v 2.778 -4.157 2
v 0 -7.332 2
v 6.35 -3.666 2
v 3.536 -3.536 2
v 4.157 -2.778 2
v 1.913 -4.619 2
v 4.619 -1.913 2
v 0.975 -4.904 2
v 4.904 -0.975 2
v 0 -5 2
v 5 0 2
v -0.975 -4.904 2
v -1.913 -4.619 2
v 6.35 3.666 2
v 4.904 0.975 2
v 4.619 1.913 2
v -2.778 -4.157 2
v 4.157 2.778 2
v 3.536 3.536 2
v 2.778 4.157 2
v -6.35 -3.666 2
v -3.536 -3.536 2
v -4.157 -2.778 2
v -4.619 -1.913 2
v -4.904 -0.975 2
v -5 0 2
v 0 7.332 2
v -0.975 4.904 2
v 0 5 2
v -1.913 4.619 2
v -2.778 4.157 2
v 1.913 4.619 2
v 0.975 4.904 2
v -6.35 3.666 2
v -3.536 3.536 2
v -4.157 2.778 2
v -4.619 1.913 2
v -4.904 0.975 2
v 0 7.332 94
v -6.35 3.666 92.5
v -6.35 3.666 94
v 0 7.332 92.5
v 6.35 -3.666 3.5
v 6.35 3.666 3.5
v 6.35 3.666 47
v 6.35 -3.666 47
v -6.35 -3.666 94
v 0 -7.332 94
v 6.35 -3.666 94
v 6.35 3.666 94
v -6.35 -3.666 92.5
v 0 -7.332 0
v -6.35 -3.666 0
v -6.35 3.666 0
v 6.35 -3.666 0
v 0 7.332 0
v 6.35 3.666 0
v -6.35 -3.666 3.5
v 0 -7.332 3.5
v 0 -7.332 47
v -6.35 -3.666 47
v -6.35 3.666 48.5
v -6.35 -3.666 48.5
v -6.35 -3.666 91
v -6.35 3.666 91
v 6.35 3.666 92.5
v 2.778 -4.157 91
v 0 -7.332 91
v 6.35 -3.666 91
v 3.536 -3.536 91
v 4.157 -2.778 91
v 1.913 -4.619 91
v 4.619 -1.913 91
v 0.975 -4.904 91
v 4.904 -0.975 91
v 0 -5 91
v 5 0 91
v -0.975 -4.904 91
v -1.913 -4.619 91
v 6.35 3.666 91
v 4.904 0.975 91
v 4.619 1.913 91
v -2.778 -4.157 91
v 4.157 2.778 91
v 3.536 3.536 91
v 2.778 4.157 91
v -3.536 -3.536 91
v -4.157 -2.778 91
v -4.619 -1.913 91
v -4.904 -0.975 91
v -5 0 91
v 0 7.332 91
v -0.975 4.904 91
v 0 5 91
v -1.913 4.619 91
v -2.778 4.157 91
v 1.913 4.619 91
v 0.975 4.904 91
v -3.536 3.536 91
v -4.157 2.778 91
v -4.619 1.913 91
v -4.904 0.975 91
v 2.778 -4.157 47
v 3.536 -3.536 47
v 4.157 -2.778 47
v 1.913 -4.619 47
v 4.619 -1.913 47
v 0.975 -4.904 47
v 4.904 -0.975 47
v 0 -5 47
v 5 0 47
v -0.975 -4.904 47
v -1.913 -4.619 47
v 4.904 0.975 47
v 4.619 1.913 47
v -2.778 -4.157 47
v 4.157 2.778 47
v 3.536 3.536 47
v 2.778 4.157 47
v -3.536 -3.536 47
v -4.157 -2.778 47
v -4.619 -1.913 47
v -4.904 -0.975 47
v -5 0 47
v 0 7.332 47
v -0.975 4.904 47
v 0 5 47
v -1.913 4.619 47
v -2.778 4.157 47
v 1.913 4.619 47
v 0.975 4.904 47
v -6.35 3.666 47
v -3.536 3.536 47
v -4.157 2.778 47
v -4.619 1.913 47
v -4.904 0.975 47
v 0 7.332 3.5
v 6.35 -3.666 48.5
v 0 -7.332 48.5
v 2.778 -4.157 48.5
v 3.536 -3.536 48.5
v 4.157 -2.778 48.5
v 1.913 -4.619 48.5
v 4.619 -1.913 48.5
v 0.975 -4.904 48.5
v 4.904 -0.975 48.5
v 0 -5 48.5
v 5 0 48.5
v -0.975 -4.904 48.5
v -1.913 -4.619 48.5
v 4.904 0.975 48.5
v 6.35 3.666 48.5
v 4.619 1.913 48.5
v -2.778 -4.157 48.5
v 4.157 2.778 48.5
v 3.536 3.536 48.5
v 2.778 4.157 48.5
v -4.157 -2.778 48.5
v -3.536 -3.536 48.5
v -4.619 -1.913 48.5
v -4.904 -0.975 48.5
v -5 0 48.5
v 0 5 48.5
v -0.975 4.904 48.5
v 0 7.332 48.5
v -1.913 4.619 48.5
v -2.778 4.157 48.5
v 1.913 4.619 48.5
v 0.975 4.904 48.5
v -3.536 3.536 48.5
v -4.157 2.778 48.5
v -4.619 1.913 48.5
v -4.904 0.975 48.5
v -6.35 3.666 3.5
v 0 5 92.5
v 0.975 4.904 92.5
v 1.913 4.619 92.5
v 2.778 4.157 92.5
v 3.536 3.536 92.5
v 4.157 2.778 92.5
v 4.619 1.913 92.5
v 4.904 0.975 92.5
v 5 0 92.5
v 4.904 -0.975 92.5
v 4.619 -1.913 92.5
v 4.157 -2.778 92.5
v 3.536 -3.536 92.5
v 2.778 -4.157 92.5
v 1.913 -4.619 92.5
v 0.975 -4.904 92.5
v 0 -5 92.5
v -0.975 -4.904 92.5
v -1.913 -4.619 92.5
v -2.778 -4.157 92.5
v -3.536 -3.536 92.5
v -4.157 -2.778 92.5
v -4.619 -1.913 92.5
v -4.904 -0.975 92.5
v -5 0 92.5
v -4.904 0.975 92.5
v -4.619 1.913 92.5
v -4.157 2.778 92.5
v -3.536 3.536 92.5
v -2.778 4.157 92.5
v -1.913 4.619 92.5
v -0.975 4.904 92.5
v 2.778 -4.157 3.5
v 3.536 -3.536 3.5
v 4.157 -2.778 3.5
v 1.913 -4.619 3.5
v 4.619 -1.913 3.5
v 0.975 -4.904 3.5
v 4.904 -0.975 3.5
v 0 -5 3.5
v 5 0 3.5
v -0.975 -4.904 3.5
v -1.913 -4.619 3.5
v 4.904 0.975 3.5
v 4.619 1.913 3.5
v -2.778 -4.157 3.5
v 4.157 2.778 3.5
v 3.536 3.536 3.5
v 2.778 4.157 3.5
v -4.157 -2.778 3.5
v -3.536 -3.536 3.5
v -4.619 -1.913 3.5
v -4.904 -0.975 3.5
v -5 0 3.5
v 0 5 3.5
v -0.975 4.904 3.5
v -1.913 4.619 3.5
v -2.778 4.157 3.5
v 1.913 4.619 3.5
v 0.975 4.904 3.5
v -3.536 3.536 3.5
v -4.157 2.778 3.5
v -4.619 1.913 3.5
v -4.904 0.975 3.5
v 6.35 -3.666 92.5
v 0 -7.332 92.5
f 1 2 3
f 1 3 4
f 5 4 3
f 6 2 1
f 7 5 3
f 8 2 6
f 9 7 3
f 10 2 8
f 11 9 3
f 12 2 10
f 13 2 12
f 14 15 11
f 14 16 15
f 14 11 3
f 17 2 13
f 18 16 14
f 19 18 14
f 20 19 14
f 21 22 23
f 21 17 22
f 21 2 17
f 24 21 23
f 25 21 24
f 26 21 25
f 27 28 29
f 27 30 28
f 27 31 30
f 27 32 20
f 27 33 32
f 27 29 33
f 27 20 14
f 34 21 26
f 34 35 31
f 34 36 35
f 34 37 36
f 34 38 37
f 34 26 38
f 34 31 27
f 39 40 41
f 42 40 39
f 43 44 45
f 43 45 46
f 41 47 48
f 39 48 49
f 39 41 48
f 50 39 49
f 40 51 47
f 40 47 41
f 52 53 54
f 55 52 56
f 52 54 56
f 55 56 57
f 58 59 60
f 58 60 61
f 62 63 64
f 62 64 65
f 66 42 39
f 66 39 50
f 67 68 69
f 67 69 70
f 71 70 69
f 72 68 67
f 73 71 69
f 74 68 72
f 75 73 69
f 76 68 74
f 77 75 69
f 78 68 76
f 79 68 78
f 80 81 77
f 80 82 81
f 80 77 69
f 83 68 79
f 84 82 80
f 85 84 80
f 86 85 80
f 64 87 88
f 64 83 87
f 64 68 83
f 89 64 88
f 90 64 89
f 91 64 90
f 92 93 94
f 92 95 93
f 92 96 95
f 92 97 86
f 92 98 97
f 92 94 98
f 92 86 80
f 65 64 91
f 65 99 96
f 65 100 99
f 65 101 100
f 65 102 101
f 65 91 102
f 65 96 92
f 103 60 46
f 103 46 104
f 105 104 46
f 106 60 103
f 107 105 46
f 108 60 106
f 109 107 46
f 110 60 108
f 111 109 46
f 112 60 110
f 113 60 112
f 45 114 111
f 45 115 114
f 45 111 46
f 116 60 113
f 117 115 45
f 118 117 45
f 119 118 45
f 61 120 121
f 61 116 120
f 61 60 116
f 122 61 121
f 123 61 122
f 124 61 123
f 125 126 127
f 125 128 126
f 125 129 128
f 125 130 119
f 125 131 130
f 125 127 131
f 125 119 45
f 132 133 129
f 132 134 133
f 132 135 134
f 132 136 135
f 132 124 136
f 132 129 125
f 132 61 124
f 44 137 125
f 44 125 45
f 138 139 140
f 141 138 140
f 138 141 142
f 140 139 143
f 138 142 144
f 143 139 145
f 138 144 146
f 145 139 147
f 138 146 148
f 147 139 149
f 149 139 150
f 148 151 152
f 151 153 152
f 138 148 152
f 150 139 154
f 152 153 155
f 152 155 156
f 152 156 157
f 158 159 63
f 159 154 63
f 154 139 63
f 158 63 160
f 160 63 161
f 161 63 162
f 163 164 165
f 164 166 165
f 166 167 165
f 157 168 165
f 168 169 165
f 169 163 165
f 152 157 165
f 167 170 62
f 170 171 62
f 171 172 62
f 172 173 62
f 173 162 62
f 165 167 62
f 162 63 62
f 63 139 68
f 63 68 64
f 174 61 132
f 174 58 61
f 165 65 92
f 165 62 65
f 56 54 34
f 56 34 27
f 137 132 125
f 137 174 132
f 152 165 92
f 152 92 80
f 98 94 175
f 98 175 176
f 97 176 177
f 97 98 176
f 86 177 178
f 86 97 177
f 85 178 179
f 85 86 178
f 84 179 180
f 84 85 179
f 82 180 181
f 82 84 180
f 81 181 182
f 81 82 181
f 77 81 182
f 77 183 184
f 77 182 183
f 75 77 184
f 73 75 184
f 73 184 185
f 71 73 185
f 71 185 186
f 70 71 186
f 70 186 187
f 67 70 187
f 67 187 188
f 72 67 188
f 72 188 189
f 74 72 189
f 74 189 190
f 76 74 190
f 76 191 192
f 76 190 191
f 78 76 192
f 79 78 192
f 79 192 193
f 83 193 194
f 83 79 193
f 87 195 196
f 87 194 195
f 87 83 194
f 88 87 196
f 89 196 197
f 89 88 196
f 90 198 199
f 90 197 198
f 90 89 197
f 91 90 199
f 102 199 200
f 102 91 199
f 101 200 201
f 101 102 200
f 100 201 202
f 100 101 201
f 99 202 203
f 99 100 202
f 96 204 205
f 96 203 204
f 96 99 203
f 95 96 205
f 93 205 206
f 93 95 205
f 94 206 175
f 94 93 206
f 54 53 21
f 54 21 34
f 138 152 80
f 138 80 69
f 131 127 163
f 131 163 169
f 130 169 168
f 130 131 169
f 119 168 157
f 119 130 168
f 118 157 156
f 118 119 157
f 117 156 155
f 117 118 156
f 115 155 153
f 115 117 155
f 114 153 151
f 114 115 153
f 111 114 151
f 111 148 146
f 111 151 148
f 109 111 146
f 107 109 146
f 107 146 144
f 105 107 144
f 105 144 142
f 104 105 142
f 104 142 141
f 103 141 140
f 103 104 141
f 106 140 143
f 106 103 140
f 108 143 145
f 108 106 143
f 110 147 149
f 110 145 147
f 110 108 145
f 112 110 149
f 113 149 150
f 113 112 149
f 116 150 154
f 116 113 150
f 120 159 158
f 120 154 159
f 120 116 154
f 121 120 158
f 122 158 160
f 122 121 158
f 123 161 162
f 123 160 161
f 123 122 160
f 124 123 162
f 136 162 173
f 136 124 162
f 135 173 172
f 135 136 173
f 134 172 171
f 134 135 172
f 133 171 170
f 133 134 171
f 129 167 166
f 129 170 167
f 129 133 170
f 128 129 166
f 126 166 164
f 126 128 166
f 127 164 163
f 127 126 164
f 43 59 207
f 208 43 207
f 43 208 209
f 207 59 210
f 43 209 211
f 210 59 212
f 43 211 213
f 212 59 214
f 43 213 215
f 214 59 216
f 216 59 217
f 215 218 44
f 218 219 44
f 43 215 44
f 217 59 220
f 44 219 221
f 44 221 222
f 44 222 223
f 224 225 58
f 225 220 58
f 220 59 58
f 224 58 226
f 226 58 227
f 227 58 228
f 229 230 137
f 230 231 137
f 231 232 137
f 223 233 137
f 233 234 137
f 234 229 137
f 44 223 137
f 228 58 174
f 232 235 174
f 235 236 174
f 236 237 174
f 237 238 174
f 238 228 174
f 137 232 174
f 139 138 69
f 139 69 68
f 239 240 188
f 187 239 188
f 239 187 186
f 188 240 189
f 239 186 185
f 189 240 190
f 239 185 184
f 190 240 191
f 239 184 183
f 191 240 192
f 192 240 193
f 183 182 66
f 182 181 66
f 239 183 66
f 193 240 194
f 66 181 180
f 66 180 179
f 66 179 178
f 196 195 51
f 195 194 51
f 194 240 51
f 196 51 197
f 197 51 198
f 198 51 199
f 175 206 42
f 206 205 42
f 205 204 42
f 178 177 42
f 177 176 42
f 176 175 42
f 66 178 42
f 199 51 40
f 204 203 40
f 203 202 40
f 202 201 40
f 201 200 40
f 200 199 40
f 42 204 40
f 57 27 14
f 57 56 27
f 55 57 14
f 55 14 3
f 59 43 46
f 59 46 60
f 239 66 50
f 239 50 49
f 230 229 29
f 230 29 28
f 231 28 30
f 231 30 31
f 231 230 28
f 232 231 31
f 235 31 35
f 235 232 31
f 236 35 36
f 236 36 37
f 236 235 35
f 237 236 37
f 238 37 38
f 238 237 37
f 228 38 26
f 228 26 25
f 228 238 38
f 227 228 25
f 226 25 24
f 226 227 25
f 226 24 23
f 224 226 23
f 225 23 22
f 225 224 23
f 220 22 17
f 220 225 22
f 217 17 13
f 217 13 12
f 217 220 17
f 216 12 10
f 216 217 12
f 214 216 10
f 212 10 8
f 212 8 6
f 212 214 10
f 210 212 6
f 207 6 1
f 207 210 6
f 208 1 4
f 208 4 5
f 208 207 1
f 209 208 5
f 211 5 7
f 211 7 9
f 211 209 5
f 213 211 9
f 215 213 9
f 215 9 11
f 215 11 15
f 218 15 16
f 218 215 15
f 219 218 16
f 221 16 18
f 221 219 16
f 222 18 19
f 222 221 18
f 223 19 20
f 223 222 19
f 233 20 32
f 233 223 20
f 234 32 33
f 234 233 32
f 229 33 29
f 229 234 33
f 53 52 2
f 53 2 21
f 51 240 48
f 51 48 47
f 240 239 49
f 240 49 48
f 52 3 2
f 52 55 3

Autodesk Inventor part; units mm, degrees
ref_plane "YZ Plane" through (0, 0, 0) normal (1, 0, 0) x (0, 1, 0)
ref_plane "XZ Plane" through (0, 0, 0) normal (0, 1, 0) x (-1, 0, 0)
ref_plane "XY Plane" through (0, 0, 0) normal (0, 0, 1) x (1, 0, 0)
sketch "Sketch1" plane through (0, 0, 0) normal (0, 0, 1) x (1, 0, 0)
  line L0 (6.35, -3.6662) -> (0, -7.3323)
  line L1 (0, -7.3323) -> (-6.35, -3.6662)
  line L2 (-6.35, -3.6662) -> (-6.35, 3.6662)
  line L3 (-6.35, 3.6662) -> (0, 7.3323)
  line L4 (0, 7.3323) -> (6.35, 3.6662)
  line L5 (6.35, 3.6662) -> (6.35, -3.6662)
  point P0 (0, 0)
  point P1 (0, 0)
  dimension "d0" = 12.7
extrude "Extrusion1" add sketch "Sketch1" along normal blind 94
sketch "Sketch2" plane through (0, 0, 0) normal (1, 0, 0) x (0, 1, 0)
  line L0 (15, 2) -> (5, 2)
  line L1 (5, 2) -> (5, 3.5)
  line L2 (5, 3.5) -> (15, 3.5)
  line L3 (15, 3.5) -> (15, 2)
  line L4 (3.6662, 0) -> (7.3323, 0) projected
  line L5 (0, -18.42) -> (0, 110.52) projected
  line L6 (15, 92.5) -> (5, 92.5)
  line L7 (5, 92.5) -> (5, 91)
  line L8 (5, 91) -> (15, 91)
  line L9 (15, 91) -> (15, 92.5)
  line L10 (15, 48.5) -> (5, 48.5)
  line L11 (5, 48.5) -> (5, 47)
  line L12 (5, 47) -> (15, 47)
  line L13 (15, 47) -> (15, 48.5)
  point P0 (0, 0)
  point P1 (0, 0)
  point P2 (15, 2.75)
  point P3 (15, 47.75)
  dimension "d3" = 1.5
  dimension "d4" = 2
  dimension "d5" = 10
  dimension "d6" = 5
  dimension "d8" = 91
  dimension "d9" = 47
revolve "Revolution1" cut sketch "Sketch2" angle 360 about axis through (0, 0, -10) along (0, 0, 1)
properties part number "Drive Shaft"
